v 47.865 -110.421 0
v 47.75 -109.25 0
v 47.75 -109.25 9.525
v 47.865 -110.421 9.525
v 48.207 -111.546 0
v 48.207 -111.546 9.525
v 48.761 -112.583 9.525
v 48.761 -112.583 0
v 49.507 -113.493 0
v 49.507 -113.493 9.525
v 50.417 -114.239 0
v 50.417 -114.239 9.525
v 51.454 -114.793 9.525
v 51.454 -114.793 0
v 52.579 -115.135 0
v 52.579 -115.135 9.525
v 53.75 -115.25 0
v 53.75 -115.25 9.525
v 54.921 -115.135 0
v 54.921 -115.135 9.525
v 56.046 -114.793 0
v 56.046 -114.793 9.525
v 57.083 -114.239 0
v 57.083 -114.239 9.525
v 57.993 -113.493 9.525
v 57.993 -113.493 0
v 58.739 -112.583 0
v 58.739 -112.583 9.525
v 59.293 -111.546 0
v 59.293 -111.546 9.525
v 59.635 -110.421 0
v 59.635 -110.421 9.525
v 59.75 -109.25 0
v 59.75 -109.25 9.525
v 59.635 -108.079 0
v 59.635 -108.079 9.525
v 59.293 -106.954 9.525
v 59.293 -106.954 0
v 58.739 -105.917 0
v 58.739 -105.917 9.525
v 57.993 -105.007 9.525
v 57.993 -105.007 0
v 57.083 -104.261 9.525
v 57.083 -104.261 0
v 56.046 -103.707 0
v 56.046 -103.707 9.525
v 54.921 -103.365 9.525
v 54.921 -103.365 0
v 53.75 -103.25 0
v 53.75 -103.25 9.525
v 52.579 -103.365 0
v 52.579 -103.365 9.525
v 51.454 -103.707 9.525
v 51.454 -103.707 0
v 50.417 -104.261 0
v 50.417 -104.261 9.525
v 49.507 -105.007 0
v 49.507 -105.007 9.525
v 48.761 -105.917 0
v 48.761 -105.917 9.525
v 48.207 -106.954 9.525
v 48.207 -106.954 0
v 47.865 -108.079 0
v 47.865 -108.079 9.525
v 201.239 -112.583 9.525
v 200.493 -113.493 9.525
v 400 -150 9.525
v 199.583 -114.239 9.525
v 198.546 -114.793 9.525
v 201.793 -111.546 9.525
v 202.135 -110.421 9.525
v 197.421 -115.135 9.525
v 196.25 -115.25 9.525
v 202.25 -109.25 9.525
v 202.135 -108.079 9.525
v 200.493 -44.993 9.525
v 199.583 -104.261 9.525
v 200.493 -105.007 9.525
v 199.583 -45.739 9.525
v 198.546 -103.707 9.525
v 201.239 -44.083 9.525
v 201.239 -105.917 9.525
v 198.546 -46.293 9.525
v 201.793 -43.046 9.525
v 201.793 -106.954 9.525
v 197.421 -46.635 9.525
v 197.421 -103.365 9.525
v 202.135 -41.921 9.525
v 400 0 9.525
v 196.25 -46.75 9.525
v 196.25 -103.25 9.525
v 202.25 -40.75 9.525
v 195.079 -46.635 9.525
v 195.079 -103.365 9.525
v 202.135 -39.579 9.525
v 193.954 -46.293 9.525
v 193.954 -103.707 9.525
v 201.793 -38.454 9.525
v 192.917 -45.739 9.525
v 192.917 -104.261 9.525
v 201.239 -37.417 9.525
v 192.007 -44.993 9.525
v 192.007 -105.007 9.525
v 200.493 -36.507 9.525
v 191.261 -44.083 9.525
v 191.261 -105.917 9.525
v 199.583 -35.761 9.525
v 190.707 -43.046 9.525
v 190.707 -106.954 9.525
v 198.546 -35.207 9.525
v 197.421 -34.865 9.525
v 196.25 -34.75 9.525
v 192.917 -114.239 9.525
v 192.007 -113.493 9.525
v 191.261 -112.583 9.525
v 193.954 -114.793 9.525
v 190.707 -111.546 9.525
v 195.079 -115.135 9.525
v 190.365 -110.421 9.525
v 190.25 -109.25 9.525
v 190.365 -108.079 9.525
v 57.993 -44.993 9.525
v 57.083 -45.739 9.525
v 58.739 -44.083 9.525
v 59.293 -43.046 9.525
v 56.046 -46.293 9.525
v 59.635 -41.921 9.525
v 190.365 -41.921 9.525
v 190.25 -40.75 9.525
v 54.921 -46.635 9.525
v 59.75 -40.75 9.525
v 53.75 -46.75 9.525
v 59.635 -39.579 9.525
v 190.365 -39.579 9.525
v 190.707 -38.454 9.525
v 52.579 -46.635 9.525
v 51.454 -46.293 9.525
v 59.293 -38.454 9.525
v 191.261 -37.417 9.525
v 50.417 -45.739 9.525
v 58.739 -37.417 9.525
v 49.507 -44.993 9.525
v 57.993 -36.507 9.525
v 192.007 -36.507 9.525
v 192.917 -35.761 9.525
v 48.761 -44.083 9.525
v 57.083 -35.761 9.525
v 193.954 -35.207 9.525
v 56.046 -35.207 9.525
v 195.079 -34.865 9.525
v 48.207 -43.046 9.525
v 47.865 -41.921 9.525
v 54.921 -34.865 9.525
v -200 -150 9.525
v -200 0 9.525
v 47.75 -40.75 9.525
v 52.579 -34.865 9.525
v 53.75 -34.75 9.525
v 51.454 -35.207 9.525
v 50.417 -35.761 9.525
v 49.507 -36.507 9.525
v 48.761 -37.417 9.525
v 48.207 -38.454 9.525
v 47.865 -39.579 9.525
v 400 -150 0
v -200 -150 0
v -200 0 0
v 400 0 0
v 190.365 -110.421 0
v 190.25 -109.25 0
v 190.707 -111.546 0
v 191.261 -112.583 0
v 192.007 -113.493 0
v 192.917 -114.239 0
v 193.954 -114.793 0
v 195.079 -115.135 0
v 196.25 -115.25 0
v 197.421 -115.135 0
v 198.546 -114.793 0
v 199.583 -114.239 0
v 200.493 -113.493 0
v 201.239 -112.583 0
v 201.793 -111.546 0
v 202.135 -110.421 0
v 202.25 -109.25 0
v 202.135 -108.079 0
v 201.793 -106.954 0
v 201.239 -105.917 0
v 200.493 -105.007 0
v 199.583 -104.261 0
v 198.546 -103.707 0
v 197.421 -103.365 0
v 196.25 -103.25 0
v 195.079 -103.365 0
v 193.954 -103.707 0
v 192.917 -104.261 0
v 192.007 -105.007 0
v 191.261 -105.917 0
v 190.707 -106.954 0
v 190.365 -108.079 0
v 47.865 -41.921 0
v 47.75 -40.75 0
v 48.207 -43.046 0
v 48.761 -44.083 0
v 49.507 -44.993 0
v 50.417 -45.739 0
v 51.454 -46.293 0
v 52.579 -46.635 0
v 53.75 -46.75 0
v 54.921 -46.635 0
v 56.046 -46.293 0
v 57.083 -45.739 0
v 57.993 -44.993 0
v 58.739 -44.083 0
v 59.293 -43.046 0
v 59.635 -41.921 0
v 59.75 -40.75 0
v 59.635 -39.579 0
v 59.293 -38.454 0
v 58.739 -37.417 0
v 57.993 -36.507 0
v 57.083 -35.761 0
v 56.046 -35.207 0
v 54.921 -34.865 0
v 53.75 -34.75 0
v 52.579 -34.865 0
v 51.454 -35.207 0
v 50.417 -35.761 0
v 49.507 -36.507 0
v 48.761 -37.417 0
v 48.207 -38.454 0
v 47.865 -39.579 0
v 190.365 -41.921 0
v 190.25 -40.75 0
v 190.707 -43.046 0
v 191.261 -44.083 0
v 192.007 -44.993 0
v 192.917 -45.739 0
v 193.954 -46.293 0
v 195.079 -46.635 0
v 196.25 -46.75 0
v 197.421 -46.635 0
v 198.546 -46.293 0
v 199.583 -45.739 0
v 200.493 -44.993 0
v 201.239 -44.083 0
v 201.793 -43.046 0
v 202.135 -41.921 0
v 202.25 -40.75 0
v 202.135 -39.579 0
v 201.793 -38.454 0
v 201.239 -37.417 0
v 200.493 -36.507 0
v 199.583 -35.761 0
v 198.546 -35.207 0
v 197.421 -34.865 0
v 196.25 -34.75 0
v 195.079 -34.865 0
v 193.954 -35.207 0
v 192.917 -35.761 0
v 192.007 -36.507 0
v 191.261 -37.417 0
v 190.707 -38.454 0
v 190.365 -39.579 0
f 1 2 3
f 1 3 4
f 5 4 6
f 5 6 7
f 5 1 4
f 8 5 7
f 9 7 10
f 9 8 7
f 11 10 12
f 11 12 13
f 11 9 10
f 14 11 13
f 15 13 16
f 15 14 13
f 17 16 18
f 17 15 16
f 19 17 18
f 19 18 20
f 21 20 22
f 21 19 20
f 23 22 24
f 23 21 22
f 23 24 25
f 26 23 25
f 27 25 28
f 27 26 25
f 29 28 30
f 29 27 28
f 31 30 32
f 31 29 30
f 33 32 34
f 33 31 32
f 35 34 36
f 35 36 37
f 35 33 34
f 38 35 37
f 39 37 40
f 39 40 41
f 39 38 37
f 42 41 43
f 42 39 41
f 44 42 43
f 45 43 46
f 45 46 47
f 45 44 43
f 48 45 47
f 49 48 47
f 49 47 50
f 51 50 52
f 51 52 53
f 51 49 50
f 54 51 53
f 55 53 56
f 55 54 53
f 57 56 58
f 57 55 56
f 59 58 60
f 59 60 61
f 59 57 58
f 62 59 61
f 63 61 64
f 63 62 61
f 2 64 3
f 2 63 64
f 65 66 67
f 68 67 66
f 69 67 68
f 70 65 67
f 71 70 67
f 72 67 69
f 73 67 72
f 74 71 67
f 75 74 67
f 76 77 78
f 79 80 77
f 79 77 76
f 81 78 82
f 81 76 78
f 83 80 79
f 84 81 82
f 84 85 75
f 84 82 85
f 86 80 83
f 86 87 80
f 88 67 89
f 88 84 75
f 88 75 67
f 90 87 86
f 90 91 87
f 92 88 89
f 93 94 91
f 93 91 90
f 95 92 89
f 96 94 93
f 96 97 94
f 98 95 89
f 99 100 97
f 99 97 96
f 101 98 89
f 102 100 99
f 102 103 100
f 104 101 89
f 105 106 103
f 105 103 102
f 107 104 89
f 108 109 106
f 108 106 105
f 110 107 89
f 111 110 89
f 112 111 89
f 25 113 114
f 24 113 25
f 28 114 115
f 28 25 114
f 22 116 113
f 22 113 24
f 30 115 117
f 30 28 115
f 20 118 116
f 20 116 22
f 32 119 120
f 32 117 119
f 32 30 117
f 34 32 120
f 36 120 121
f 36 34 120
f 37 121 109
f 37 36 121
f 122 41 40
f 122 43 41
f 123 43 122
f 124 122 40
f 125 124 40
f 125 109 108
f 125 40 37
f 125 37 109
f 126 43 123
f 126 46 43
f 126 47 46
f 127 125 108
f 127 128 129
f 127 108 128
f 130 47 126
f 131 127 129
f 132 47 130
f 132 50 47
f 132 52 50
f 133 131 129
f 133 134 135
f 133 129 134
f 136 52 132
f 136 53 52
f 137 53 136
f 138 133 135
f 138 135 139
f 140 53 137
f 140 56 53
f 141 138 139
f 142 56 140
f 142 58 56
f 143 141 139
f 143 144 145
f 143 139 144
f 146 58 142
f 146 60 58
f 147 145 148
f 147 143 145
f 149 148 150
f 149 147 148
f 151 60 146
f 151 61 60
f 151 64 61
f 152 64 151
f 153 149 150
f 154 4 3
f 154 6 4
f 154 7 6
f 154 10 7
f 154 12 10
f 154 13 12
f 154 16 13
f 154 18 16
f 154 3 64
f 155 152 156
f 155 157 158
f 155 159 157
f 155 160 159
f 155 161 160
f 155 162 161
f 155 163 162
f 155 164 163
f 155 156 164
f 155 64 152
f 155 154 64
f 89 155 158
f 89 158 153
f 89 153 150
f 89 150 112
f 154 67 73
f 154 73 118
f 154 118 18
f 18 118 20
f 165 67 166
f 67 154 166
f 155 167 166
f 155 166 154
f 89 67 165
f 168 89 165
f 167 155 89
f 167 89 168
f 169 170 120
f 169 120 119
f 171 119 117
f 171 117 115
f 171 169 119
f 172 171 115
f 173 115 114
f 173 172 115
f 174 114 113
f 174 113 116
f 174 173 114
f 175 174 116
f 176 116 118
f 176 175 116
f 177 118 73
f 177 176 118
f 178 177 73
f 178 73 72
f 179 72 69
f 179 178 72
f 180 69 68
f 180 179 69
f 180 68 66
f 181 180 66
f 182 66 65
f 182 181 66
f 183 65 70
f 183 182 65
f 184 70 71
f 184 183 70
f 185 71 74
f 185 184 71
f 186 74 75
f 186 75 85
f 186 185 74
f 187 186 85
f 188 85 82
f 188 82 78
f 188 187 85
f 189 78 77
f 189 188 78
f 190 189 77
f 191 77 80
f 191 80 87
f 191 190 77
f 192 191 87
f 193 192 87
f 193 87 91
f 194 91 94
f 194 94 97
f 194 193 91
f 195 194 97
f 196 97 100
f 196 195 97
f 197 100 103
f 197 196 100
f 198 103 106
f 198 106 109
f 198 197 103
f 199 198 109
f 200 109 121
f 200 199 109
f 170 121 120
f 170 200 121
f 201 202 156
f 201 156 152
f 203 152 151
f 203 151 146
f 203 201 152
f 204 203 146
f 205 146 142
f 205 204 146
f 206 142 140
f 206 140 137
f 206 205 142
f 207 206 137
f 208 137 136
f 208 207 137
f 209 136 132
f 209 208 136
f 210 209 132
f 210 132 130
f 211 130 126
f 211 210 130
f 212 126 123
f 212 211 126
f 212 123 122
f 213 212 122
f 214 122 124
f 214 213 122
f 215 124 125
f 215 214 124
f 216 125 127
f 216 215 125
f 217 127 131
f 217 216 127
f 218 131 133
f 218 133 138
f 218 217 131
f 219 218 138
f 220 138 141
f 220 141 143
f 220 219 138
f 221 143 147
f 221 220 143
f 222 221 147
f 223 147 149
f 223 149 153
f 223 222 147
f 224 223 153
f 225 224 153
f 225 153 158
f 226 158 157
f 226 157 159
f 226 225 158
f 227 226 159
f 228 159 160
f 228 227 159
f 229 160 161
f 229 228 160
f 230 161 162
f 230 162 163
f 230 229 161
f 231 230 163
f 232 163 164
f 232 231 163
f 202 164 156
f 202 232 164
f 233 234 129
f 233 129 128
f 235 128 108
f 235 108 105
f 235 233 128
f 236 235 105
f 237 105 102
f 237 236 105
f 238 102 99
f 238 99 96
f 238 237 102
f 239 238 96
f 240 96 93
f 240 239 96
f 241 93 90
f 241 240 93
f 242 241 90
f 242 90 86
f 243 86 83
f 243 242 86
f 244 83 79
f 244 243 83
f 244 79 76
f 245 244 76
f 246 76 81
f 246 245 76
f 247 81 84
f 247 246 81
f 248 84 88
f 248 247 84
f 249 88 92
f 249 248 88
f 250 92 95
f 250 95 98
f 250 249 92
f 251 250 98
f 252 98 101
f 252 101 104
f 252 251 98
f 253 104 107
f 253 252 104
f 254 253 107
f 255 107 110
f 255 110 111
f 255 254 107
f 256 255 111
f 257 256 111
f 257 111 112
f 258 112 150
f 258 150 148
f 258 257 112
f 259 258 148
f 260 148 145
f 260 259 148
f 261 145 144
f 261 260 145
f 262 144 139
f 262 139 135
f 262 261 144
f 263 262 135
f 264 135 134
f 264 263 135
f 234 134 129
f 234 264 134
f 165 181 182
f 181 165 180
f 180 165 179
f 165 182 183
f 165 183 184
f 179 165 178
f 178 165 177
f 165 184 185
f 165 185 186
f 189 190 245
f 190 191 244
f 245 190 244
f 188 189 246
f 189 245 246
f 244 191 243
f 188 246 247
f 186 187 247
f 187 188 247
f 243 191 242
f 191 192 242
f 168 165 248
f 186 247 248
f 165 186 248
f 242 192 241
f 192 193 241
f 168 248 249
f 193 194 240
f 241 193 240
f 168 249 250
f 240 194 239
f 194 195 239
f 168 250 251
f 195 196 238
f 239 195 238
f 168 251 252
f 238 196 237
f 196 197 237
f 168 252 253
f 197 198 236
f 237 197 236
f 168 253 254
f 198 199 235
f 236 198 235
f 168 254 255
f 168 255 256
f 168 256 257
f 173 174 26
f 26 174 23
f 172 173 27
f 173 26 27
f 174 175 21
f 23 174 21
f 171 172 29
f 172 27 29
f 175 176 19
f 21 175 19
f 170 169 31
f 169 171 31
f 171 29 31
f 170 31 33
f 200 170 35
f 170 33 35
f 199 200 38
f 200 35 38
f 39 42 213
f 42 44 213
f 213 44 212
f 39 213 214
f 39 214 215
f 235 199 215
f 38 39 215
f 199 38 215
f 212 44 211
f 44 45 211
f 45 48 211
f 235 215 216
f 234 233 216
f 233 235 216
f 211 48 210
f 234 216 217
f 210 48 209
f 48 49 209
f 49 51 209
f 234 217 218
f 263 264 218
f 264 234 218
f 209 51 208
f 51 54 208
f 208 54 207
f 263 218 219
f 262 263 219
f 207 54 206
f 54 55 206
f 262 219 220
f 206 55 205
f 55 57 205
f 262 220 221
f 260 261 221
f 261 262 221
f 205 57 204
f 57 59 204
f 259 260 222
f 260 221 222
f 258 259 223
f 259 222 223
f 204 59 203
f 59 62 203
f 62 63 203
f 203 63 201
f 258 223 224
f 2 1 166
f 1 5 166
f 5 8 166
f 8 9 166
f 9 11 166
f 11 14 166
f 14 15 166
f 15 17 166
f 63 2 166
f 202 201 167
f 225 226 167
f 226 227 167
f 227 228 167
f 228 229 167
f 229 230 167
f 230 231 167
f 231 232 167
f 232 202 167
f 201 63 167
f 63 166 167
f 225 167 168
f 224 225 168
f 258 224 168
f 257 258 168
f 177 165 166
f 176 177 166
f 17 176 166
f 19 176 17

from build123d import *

# Parameters (mm, degrees)
SKETCH1_W           = 250
SKETCH1_H           = 150
SKETCH1_R           = 6
BOSS_EXTRUDE1_DEPTH = 9.525
SKETCH2_W           = 9.525
SKETCH2_H           = 150
BOSS_EXTRUDE2_DEPTH = 200
SKETCH3_W           = 9.525
SKETCH3_H           = 150
BOSS_EXTRUDE3_DEPTH = 150


with BuildPart() as part:
    # Sketch1 → Boss-Extrude1 (new body)
    with BuildSketch(Plane.XY):
        with Locations((125, -75)):
            Rectangle(SKETCH1_W, SKETCH1_H)
        with Locations(Location((53.75, -40.75, 0), (0, 0, 180))):
            Circle(SKETCH1_R, mode=Mode.SUBTRACT)
        with Locations(Location((196.25, -40.75, 0), (0, 0, 180))):
            Circle(SKETCH1_R, mode=Mode.SUBTRACT)
        with Locations(Location((196.25, -109.25, 0), (0, 0, 180))):
            Circle(SKETCH1_R, mode=Mode.SUBTRACT)
        with Locations(Location((53.75, -109.25, 0), (0, 0, 180))):
            Circle(SKETCH1_R, mode=Mode.SUBTRACT)
    extrude(amount=BOSS_EXTRUDE1_DEPTH)

    # Sketch2 → Boss-Extrude2 (add)
    with BuildSketch(Plane.ZY):
        with Locations((4.7625, -75)):
            Rectangle(SKETCH2_W, SKETCH2_H)
    extrude(amount=BOSS_EXTRUDE2_DEPTH)

    # Sketch3 → Boss-Extrude3 (add)
    with BuildSketch(Plane(origin=(250, 0, 0), x_dir=(0, 0, -1), z_dir=(1, 0, 0))):
        with Locations((-4.7625, -75)):
            Rectangle(SKETCH3_W, SKETCH3_H)
    extrude(amount=BOSS_EXTRUDE3_DEPTH)


solid = part.part
